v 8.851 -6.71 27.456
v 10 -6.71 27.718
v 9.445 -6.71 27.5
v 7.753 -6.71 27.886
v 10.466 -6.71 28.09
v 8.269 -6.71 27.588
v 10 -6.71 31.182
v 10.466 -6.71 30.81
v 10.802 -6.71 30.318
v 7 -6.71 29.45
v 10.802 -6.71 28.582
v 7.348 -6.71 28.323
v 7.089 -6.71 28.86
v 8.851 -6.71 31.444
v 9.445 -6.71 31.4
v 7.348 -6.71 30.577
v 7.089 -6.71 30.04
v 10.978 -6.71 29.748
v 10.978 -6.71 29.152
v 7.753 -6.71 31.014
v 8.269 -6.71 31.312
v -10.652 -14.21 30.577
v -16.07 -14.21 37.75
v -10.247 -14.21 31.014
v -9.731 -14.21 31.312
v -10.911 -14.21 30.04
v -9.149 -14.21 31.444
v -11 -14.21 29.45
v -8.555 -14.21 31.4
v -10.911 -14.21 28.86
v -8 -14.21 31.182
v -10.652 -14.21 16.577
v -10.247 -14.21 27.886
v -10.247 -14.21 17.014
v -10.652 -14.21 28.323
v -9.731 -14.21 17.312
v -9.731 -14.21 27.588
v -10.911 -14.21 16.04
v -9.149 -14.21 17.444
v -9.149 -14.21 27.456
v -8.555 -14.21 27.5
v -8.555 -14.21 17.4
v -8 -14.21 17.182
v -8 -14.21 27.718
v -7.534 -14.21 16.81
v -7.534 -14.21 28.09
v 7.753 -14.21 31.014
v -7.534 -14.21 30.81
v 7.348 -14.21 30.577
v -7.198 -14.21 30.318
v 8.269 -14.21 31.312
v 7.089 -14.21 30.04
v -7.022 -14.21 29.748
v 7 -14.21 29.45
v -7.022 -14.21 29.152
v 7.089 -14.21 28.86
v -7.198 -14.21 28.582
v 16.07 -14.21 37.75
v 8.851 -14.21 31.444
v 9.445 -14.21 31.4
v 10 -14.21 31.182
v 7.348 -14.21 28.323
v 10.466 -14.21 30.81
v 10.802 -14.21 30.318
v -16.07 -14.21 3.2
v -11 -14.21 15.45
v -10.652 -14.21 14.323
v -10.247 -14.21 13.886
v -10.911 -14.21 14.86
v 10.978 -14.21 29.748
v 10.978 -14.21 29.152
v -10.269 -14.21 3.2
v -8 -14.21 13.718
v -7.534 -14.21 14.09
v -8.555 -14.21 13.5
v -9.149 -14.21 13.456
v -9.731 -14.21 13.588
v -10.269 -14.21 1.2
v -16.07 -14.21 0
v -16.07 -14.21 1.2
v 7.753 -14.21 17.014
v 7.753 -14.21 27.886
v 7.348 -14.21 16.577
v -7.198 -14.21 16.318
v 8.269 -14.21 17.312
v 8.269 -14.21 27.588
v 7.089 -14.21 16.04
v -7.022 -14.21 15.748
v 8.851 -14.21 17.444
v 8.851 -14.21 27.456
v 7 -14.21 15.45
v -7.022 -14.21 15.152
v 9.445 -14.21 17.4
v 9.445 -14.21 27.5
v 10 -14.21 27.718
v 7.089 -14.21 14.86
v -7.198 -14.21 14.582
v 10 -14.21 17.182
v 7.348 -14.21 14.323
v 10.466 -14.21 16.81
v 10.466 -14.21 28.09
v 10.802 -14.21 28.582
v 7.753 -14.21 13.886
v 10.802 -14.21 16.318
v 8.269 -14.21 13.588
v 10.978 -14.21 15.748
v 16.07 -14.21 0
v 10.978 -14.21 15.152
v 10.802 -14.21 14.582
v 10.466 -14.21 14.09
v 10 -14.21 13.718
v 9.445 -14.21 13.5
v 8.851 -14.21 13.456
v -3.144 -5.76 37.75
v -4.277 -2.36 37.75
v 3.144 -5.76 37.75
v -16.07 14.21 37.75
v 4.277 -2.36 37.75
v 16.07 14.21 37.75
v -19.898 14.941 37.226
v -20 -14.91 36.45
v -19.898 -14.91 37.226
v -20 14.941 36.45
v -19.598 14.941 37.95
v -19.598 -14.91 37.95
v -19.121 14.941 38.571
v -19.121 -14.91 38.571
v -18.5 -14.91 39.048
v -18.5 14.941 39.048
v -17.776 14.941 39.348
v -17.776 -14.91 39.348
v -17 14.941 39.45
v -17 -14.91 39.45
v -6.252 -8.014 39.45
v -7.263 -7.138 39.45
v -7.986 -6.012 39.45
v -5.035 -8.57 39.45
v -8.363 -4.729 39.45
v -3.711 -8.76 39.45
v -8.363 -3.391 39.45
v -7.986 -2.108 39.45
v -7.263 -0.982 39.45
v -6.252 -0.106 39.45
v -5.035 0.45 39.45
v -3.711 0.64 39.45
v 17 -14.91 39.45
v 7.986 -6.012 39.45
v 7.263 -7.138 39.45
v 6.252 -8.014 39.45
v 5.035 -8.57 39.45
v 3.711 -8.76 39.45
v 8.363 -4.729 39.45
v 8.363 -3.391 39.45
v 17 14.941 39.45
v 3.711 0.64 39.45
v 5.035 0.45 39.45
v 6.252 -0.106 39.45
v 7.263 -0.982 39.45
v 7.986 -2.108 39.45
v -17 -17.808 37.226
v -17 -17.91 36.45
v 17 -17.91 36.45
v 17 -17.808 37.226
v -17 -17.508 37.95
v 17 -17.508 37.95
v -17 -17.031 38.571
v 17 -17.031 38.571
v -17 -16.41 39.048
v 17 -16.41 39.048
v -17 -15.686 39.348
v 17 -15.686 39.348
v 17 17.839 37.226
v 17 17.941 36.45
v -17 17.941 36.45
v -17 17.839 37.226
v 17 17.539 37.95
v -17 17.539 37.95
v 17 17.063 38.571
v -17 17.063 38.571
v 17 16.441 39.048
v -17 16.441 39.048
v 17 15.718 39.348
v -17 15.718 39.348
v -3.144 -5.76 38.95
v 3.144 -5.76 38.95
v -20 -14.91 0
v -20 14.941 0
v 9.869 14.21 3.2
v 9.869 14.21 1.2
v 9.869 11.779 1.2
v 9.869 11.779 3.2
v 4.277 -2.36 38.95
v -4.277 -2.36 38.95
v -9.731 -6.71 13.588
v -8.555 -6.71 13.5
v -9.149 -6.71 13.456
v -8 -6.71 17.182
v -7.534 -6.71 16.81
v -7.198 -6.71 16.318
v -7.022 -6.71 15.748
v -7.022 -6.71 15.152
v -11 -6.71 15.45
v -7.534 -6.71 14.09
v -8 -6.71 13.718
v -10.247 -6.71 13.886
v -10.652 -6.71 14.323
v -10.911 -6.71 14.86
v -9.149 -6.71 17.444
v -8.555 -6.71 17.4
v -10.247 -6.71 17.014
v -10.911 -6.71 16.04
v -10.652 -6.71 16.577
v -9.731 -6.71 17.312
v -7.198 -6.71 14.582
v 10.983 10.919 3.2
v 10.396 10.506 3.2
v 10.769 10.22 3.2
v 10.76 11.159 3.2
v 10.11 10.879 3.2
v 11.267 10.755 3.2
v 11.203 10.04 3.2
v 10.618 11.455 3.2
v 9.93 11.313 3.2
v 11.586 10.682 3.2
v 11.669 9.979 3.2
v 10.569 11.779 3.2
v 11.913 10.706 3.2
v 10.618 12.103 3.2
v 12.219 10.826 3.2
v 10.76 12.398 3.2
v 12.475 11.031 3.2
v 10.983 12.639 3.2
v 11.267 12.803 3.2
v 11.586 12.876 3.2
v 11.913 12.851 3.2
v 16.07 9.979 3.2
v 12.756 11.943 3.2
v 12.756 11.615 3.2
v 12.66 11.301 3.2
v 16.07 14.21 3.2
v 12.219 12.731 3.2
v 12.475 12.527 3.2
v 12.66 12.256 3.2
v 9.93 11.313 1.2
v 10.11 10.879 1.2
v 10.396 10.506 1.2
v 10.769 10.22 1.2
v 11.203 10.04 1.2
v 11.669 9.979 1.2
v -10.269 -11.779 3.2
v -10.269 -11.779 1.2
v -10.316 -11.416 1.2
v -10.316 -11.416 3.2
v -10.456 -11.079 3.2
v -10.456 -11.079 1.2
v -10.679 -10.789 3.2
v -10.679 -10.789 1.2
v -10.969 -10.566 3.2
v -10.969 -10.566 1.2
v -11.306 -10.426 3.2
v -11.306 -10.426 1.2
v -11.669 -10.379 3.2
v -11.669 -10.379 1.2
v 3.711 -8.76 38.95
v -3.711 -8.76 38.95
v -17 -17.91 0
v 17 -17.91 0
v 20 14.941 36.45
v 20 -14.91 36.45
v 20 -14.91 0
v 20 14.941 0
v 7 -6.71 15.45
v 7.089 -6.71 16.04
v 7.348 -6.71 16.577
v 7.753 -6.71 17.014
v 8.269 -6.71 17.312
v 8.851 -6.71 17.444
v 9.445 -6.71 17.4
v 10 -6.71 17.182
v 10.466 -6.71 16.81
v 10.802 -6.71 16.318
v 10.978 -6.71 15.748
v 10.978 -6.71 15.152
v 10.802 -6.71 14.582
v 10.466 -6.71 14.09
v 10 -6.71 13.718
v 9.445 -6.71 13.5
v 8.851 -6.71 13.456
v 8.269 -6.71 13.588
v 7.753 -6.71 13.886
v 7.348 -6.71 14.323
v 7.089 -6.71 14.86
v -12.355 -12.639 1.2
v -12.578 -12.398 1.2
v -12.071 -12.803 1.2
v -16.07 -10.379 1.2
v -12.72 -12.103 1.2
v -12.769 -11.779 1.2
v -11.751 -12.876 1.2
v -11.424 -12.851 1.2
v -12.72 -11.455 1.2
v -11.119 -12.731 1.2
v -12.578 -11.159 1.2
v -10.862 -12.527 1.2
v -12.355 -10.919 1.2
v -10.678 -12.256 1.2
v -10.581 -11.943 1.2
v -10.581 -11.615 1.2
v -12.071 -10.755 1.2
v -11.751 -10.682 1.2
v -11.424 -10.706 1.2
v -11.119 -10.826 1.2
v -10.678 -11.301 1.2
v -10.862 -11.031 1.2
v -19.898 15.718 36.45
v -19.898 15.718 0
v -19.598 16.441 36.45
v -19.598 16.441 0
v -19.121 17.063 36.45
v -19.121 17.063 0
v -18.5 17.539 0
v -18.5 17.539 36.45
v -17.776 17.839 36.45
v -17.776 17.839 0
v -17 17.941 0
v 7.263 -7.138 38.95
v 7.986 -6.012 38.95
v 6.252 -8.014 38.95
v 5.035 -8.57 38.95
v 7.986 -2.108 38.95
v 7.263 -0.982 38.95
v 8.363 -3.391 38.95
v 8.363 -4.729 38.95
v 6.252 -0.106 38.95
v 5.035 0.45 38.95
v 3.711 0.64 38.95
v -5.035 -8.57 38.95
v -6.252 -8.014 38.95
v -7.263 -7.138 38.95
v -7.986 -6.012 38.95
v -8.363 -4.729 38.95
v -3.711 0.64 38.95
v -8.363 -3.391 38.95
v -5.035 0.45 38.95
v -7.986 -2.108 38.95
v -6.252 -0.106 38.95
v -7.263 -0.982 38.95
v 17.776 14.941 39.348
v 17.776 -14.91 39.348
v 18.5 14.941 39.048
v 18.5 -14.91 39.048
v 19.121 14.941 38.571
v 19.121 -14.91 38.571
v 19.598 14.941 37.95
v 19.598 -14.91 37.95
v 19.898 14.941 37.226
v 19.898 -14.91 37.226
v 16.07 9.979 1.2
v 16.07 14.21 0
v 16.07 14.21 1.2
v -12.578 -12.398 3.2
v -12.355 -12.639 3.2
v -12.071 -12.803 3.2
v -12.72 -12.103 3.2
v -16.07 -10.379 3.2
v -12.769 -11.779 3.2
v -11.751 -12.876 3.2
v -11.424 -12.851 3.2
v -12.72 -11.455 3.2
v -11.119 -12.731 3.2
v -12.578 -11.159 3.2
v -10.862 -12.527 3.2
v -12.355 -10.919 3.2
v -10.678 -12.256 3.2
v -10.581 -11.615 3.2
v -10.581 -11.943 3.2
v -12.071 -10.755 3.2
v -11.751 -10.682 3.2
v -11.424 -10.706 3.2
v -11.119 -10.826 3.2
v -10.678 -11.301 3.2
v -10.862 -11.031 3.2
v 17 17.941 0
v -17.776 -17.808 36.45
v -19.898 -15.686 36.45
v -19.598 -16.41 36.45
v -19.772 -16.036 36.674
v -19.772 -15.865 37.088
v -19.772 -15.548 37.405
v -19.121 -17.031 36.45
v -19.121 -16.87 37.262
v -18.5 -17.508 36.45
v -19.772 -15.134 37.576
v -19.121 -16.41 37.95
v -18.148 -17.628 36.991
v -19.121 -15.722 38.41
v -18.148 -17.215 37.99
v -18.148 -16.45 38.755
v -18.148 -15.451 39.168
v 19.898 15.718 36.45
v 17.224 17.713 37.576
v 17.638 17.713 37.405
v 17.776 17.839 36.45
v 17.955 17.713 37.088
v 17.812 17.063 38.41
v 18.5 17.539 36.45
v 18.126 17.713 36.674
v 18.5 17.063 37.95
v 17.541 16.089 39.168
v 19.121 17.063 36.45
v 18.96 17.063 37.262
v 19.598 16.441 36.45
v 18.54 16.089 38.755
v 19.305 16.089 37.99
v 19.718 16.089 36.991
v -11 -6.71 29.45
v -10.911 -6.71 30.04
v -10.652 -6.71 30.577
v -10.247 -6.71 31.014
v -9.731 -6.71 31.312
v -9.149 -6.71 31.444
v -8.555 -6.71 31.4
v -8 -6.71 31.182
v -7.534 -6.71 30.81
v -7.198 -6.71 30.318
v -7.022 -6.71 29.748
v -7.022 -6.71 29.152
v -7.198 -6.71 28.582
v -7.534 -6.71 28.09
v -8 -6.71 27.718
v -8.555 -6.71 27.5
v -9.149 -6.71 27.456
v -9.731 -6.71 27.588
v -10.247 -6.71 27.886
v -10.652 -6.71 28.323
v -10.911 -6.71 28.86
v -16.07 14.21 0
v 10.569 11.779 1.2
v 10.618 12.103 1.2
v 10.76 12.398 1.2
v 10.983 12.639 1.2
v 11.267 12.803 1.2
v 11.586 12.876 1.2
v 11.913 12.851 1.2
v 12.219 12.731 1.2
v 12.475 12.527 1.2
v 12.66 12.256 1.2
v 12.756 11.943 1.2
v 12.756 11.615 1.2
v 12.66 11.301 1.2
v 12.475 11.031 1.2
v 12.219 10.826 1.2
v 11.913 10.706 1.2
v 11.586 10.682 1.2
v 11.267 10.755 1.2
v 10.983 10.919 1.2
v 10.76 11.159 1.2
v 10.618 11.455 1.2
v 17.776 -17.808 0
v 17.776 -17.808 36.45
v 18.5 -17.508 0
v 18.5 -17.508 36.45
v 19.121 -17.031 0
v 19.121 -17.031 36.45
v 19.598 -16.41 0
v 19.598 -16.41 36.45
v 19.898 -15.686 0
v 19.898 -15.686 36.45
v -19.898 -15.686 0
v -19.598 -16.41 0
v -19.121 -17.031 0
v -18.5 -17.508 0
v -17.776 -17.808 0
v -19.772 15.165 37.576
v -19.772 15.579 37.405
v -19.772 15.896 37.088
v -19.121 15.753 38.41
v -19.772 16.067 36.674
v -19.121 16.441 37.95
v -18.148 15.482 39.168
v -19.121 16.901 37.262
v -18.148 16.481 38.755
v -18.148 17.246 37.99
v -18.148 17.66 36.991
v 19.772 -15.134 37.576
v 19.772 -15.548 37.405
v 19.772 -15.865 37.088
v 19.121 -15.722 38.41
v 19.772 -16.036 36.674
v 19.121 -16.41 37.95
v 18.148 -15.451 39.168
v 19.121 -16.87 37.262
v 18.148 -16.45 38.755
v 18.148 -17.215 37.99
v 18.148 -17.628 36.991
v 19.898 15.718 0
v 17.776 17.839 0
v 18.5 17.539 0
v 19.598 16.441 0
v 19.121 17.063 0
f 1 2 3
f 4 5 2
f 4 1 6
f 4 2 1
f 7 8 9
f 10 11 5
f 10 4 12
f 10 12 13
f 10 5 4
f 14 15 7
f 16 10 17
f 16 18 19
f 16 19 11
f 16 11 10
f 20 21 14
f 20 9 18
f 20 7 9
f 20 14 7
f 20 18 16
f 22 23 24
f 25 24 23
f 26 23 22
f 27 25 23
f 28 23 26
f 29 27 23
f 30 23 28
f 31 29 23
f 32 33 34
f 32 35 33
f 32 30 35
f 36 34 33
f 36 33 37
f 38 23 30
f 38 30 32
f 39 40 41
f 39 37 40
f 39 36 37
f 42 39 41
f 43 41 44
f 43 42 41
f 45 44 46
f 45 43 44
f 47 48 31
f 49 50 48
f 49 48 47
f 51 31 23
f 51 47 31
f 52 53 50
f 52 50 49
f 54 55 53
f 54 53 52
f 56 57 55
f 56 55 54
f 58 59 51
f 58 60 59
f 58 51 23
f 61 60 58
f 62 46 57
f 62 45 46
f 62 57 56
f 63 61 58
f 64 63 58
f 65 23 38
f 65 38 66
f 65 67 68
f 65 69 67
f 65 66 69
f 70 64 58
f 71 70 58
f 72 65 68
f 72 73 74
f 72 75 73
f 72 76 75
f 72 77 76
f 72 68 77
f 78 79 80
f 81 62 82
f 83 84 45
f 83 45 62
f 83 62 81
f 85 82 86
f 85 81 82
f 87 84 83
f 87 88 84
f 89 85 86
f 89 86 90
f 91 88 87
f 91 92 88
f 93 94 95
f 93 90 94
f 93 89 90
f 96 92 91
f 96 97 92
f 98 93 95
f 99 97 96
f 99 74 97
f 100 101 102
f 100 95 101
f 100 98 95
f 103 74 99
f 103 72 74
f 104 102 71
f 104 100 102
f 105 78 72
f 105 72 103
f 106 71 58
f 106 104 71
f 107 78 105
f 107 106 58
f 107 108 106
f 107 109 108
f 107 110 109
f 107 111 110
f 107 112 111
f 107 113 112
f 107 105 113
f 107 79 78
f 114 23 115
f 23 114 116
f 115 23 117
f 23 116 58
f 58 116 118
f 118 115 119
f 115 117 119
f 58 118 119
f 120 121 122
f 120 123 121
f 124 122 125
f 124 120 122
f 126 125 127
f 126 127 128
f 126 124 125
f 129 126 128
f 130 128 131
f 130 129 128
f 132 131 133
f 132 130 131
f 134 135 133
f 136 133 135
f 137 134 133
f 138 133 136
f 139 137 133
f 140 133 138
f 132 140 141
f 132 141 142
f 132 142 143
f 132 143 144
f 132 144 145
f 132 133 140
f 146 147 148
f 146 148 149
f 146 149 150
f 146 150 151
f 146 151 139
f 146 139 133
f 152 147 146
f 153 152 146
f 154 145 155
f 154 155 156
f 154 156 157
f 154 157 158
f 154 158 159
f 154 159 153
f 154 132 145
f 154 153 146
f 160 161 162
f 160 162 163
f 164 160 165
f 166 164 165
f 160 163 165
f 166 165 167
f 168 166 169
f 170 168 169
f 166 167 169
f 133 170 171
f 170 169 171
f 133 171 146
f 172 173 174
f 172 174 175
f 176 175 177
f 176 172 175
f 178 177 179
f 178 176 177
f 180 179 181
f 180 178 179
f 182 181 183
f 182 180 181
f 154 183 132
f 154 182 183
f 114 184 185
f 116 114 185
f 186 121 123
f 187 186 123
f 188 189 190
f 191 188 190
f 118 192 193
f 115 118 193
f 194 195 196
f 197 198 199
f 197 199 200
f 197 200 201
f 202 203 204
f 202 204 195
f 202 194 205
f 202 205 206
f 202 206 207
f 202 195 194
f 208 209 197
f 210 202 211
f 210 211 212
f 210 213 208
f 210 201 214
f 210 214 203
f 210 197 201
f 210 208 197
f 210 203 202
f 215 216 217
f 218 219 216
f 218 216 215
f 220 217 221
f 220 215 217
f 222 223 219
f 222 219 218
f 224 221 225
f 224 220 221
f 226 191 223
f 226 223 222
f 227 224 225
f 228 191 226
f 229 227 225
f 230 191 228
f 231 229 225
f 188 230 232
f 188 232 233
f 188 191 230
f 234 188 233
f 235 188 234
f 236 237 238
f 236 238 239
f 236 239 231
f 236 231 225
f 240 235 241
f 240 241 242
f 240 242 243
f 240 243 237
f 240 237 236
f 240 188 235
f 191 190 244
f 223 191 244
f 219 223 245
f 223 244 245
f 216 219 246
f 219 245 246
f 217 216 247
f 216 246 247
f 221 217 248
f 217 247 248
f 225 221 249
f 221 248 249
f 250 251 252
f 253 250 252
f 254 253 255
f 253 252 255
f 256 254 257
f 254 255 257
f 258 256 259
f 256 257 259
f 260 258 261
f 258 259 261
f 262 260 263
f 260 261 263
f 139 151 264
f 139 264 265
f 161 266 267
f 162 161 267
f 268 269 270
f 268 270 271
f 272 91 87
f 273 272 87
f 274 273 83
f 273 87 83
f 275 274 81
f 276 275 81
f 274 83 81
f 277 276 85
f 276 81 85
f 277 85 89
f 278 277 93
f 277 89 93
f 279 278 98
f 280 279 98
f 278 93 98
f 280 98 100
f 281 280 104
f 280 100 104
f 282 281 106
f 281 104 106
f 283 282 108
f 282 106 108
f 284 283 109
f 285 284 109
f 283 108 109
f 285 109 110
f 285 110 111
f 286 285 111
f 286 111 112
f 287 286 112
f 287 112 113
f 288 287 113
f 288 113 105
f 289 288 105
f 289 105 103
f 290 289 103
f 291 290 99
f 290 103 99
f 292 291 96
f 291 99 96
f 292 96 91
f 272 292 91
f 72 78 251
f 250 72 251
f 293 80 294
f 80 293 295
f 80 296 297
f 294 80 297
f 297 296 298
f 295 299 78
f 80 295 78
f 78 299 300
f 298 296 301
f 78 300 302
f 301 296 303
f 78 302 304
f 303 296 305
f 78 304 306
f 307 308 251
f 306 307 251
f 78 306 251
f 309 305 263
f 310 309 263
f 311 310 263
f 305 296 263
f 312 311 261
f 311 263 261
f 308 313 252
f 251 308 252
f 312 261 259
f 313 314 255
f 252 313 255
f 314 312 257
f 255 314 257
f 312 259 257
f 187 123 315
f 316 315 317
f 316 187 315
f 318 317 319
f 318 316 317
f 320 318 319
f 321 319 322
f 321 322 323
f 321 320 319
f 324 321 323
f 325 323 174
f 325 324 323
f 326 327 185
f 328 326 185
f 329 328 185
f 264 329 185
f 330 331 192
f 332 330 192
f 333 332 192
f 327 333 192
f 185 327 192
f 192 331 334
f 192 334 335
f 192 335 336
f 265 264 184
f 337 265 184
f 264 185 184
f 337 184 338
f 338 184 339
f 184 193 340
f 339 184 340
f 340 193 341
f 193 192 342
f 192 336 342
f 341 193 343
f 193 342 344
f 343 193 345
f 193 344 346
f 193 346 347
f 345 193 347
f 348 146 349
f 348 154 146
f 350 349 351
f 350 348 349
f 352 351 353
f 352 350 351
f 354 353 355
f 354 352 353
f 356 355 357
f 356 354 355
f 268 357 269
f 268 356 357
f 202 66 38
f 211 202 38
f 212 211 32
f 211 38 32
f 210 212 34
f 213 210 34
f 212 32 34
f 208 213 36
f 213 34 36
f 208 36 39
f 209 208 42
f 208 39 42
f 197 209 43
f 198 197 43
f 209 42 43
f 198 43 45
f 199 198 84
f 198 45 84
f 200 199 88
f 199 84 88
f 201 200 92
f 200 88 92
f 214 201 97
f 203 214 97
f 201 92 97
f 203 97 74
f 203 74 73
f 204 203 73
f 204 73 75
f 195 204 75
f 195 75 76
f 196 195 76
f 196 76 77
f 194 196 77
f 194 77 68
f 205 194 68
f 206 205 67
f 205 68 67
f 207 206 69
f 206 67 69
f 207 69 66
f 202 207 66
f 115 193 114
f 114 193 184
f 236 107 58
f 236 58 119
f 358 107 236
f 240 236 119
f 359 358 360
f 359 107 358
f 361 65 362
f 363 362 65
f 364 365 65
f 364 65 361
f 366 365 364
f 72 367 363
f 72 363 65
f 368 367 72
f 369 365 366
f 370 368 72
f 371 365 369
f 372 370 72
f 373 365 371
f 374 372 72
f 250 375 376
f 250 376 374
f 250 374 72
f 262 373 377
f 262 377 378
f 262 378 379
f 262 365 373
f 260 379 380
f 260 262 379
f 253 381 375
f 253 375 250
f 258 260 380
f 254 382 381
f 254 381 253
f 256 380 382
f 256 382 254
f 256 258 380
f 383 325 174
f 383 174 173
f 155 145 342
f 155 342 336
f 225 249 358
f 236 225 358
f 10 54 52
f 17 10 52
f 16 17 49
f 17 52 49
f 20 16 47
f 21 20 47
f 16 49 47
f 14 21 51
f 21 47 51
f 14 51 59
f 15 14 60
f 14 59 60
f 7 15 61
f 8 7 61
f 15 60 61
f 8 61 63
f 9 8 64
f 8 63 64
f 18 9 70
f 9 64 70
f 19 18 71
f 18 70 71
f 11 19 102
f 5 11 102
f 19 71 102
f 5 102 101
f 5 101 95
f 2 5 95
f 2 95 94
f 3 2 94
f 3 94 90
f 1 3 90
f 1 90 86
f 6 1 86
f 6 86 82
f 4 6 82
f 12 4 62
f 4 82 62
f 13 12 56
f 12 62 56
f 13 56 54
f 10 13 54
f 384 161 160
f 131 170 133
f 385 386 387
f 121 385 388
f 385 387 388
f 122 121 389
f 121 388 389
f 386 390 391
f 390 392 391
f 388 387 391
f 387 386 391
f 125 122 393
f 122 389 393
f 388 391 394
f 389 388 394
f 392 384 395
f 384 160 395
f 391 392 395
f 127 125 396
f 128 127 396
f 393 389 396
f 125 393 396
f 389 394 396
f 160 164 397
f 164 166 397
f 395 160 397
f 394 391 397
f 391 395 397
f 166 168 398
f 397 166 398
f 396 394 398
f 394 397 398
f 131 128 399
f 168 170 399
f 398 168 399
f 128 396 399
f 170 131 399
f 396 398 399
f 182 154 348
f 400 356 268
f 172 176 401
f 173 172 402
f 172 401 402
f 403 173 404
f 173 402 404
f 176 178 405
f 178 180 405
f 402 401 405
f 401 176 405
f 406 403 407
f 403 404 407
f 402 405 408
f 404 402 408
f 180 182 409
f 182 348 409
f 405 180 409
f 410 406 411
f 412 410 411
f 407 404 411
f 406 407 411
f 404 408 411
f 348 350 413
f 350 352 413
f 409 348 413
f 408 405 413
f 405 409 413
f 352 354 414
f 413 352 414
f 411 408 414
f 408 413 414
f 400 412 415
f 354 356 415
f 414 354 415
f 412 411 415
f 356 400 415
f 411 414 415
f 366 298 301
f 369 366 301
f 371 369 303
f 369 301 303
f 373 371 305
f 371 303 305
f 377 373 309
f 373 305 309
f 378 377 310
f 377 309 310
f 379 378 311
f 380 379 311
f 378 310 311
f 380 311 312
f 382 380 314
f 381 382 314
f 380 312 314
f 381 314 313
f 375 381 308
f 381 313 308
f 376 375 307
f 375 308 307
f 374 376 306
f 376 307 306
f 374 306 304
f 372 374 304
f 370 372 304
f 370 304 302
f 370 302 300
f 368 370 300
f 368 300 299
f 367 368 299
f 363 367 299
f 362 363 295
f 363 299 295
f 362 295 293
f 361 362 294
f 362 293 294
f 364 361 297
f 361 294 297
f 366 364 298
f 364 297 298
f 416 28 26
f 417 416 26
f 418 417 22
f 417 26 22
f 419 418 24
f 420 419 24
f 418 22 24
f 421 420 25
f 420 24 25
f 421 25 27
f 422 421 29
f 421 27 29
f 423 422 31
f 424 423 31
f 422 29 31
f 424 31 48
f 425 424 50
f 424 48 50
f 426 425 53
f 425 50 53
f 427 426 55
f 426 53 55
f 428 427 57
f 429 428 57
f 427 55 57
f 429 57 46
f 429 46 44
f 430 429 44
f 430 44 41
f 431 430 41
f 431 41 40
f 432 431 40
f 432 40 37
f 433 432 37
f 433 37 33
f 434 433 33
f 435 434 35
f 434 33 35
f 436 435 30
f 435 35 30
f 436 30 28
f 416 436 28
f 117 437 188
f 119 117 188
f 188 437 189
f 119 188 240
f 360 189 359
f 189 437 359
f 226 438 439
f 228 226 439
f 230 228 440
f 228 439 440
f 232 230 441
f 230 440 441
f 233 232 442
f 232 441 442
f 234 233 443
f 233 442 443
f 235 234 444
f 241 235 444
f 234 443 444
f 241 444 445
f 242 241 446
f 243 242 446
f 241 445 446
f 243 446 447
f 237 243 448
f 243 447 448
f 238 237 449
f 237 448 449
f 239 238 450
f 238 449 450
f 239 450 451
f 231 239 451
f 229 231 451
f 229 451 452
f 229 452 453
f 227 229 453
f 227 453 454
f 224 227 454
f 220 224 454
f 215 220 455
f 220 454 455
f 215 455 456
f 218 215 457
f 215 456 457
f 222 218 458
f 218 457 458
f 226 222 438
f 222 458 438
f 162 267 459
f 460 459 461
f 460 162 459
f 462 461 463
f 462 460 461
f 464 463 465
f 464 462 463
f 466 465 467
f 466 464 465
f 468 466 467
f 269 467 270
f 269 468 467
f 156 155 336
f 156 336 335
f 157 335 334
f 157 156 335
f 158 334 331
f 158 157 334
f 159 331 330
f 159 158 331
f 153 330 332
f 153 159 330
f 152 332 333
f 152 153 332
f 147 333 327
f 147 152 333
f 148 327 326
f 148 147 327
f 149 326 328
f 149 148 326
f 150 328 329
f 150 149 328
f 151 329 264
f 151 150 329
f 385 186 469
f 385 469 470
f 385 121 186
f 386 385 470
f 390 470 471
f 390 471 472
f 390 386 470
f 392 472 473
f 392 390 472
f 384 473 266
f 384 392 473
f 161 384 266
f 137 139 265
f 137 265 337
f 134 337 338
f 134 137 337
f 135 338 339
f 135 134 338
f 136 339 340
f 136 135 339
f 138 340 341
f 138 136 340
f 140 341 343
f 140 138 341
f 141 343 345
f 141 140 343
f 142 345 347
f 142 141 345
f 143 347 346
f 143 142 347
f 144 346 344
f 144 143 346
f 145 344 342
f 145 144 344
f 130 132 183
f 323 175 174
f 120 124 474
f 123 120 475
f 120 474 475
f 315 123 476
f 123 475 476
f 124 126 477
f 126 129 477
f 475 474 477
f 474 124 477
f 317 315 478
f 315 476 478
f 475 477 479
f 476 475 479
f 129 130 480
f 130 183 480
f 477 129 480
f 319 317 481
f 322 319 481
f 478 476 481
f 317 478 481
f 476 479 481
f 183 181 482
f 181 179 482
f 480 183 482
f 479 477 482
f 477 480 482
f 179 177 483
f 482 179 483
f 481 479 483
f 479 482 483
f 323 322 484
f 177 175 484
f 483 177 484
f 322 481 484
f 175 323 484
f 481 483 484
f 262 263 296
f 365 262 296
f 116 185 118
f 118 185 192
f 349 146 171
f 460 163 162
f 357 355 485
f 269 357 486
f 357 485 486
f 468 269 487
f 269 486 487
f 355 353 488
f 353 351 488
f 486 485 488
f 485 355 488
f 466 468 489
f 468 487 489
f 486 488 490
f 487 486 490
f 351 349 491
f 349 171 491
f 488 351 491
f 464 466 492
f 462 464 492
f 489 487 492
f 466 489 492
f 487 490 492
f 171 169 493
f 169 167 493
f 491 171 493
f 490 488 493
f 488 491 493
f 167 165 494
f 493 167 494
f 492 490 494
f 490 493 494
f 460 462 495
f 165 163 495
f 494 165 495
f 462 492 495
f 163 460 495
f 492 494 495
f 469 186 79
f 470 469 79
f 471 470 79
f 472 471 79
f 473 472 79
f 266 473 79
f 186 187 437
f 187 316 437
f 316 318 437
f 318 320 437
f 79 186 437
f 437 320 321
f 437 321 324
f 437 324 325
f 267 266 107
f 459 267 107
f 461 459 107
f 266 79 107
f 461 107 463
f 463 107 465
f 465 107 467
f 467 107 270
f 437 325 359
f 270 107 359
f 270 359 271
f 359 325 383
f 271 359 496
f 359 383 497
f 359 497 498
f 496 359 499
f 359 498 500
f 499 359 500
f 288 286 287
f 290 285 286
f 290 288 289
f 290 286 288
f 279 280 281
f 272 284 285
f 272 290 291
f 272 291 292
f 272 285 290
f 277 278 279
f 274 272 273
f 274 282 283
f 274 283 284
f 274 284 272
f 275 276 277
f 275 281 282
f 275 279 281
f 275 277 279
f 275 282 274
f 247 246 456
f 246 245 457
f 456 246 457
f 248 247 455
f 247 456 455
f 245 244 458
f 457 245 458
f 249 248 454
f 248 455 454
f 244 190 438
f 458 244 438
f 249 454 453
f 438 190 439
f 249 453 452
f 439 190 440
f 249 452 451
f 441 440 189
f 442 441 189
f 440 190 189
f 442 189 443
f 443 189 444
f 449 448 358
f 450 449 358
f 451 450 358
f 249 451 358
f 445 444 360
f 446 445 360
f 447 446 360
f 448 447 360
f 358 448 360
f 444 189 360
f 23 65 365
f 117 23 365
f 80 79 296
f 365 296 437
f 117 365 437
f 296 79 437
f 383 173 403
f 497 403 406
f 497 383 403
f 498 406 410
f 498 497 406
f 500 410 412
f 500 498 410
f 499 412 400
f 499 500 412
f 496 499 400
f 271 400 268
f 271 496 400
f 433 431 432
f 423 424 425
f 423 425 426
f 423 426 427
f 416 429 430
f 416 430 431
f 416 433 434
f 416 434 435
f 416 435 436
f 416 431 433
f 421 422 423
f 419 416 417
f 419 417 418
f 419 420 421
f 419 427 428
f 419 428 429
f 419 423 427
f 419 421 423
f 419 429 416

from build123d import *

# Parameters (mm, degrees)
ESQUISSE1_W             = 40
ESQUISSE1_H             = 35.851343862
ESQUISSE1_W_2           = 32.14
ESQUISSE1_H_2           = 28.42
BOSS_EXTRU_1_DEPTH      = 39.45
ESQUISSE6_R             = 2
BOSS_EXTRU_7_DEPTH      = 7.5
ESQUISSE3_W             = 40
ESQUISSE3_H             = 35.851343862
BOSS_EXTRU_5_DEPTH      = 1.7
ENL_V_MAT_EXTRU_1_DEPTH = 0.5
ESQUISSE8_R             = 1.1
BOSS_EXTRU_8_DEPTH      = 2
CONG_1_R                = 3


with BuildPart() as part:
    # Esquisse1 → Boss.-Extru.1 (new body)
    with BuildSketch(Plane.XY):
        with Locations((0, 0.015671931)):
            Rectangle(ESQUISSE1_W, ESQUISSE1_H)
        Rectangle(ESQUISSE1_W_2, ESQUISSE1_H_2, mode=Mode.SUBTRACT)
    extrude(amount=BOSS_EXTRU_1_DEPTH)

    # Esquisse6 → Boss.-Extru.7 (add)
    with BuildSketch(Plane(origin=(0, -14.21, 0), x_dir=(1, 0, 0), z_dir=(0, 1, 0))):
        with Locations(Location((-9, -15.45, 0), (0, 0, 180))):
            Circle(ESQUISSE6_R)
        with Locations(Location((9, -15.45, 0), (0, 0, 180))):
            Circle(ESQUISSE6_R)
        with Locations(Location((-9, -29.45, 0), (0, 0, 180))):
            Circle(ESQUISSE6_R)
        with Locations(Location((9, -29.45, 0), (0, 0, 180))):
            Circle(ESQUISSE6_R)
    extrude(amount=BOSS_EXTRU_7_DEPTH)

    # Esquisse3 → Boss.-Extru.5 (add)
    with BuildSketch(Plane.XY.offset(39.45)):
        with Locations((0, 0.015671931)):
            Rectangle(ESQUISSE3_W, ESQUISSE3_H)
        Polygon((-3.144151844, -5.76), (3.144151844, -5.76), (4.277485177, -2.36), (-4.277485177, -2.36), align=None, mode=Mode.SUBTRACT)
    extrude(amount=-BOSS_EXTRU_5_DEPTH)

    # Esquisse4 → Enlèv. mat.-Extru.1 (cut)
    with BuildSketch(Plane.XY.offset(39.45)):
        with BuildLine():
            Line((-3.710818511, 0.64), (3.710818511, 0.64))
            ThreePointArc((3.710818511, 0.64), (8.410818511, -4.06), (3.710818511, -8.76))
            Line((3.710818511, -8.76), (-3.710818511, -8.76))
            ThreePointArc((-3.710818511, -8.76), (-8.410818511, -4.06), (-3.710818511, 0.64))
        make_face()
    extrude(amount=-ENL_V_MAT_EXTRU_1_DEPTH, mode=Mode.SUBTRACT)

    # Esquisse8 → Boss.-Extru.8 (add)
    # profile 1 of 2: a face of its own
    with BuildSketch(Plane(origin=(0, 0, 1.2), x_dir=(-1, 0, 0), z_dir=(0, 0, -1))):
        with BuildLine():
            Line((16.07, -10.378743894), (16.07, -14.21))
            Line((16.07, -14.21), (10.268662175, -14.21))
            Line((10.268662175, -14.21), (10.268662175, -11.778743894))
            ThreePointArc((10.268662175, -11.778743894), (10.678712682, -10.7887944), (11.668662175, -10.378743894))
            Line((11.668662175, -10.378743894), (16.07, -10.378743894))
        make_face()
        with Locations((11.668662175, -11.778743894)):
            Circle(ESQUISSE8_R, mode=Mode.SUBTRACT)
    # profile 2 of 2: a face of its own
    with BuildSketch(Plane(origin=(0, 0, 1.2), x_dir=(-1, 0, 0), z_dir=(0, 0, -1))):
        with BuildLine():
            Line((-16.07, 14.21), (-9.868662175, 14.21))
            Line((-9.868662175, 14.21), (-9.868662175, 11.778743894))
            ThreePointArc((-9.868662175, 11.778743894), (-10.395869969, 10.505951688), (-11.668662175, 9.978743894))
            Line((-11.668662175, 9.978743894), (-16.07, 9.978743894))
            Line((-16.07, 9.978743894), (-16.07, 14.21))
        make_face()
        with Locations((-11.668662175, 11.778743894)):
            Circle(ESQUISSE8_R, mode=Mode.SUBTRACT)
    extrude(amount=-BOSS_EXTRU_8_DEPTH)

    # Congé1
    cong_1_edges = [part.edges().sort_by_distance(p)[0] for p in [
        (0, -17.91, 39.45),
        (-20, -17.91, 19.725),
        (20, 0.015671931, 39.45),
        (20, -17.91, 19.725),
        (0, 17.941343862, 39.45),
        (20, 17.941343862, 19.725),
        (-20, 0.015671931, 39.45),
        (-20, 17.941343862, 19.725),
    ]]
    fillet(cong_1_edges, radius=CONG_1_R)


solid = part.part
